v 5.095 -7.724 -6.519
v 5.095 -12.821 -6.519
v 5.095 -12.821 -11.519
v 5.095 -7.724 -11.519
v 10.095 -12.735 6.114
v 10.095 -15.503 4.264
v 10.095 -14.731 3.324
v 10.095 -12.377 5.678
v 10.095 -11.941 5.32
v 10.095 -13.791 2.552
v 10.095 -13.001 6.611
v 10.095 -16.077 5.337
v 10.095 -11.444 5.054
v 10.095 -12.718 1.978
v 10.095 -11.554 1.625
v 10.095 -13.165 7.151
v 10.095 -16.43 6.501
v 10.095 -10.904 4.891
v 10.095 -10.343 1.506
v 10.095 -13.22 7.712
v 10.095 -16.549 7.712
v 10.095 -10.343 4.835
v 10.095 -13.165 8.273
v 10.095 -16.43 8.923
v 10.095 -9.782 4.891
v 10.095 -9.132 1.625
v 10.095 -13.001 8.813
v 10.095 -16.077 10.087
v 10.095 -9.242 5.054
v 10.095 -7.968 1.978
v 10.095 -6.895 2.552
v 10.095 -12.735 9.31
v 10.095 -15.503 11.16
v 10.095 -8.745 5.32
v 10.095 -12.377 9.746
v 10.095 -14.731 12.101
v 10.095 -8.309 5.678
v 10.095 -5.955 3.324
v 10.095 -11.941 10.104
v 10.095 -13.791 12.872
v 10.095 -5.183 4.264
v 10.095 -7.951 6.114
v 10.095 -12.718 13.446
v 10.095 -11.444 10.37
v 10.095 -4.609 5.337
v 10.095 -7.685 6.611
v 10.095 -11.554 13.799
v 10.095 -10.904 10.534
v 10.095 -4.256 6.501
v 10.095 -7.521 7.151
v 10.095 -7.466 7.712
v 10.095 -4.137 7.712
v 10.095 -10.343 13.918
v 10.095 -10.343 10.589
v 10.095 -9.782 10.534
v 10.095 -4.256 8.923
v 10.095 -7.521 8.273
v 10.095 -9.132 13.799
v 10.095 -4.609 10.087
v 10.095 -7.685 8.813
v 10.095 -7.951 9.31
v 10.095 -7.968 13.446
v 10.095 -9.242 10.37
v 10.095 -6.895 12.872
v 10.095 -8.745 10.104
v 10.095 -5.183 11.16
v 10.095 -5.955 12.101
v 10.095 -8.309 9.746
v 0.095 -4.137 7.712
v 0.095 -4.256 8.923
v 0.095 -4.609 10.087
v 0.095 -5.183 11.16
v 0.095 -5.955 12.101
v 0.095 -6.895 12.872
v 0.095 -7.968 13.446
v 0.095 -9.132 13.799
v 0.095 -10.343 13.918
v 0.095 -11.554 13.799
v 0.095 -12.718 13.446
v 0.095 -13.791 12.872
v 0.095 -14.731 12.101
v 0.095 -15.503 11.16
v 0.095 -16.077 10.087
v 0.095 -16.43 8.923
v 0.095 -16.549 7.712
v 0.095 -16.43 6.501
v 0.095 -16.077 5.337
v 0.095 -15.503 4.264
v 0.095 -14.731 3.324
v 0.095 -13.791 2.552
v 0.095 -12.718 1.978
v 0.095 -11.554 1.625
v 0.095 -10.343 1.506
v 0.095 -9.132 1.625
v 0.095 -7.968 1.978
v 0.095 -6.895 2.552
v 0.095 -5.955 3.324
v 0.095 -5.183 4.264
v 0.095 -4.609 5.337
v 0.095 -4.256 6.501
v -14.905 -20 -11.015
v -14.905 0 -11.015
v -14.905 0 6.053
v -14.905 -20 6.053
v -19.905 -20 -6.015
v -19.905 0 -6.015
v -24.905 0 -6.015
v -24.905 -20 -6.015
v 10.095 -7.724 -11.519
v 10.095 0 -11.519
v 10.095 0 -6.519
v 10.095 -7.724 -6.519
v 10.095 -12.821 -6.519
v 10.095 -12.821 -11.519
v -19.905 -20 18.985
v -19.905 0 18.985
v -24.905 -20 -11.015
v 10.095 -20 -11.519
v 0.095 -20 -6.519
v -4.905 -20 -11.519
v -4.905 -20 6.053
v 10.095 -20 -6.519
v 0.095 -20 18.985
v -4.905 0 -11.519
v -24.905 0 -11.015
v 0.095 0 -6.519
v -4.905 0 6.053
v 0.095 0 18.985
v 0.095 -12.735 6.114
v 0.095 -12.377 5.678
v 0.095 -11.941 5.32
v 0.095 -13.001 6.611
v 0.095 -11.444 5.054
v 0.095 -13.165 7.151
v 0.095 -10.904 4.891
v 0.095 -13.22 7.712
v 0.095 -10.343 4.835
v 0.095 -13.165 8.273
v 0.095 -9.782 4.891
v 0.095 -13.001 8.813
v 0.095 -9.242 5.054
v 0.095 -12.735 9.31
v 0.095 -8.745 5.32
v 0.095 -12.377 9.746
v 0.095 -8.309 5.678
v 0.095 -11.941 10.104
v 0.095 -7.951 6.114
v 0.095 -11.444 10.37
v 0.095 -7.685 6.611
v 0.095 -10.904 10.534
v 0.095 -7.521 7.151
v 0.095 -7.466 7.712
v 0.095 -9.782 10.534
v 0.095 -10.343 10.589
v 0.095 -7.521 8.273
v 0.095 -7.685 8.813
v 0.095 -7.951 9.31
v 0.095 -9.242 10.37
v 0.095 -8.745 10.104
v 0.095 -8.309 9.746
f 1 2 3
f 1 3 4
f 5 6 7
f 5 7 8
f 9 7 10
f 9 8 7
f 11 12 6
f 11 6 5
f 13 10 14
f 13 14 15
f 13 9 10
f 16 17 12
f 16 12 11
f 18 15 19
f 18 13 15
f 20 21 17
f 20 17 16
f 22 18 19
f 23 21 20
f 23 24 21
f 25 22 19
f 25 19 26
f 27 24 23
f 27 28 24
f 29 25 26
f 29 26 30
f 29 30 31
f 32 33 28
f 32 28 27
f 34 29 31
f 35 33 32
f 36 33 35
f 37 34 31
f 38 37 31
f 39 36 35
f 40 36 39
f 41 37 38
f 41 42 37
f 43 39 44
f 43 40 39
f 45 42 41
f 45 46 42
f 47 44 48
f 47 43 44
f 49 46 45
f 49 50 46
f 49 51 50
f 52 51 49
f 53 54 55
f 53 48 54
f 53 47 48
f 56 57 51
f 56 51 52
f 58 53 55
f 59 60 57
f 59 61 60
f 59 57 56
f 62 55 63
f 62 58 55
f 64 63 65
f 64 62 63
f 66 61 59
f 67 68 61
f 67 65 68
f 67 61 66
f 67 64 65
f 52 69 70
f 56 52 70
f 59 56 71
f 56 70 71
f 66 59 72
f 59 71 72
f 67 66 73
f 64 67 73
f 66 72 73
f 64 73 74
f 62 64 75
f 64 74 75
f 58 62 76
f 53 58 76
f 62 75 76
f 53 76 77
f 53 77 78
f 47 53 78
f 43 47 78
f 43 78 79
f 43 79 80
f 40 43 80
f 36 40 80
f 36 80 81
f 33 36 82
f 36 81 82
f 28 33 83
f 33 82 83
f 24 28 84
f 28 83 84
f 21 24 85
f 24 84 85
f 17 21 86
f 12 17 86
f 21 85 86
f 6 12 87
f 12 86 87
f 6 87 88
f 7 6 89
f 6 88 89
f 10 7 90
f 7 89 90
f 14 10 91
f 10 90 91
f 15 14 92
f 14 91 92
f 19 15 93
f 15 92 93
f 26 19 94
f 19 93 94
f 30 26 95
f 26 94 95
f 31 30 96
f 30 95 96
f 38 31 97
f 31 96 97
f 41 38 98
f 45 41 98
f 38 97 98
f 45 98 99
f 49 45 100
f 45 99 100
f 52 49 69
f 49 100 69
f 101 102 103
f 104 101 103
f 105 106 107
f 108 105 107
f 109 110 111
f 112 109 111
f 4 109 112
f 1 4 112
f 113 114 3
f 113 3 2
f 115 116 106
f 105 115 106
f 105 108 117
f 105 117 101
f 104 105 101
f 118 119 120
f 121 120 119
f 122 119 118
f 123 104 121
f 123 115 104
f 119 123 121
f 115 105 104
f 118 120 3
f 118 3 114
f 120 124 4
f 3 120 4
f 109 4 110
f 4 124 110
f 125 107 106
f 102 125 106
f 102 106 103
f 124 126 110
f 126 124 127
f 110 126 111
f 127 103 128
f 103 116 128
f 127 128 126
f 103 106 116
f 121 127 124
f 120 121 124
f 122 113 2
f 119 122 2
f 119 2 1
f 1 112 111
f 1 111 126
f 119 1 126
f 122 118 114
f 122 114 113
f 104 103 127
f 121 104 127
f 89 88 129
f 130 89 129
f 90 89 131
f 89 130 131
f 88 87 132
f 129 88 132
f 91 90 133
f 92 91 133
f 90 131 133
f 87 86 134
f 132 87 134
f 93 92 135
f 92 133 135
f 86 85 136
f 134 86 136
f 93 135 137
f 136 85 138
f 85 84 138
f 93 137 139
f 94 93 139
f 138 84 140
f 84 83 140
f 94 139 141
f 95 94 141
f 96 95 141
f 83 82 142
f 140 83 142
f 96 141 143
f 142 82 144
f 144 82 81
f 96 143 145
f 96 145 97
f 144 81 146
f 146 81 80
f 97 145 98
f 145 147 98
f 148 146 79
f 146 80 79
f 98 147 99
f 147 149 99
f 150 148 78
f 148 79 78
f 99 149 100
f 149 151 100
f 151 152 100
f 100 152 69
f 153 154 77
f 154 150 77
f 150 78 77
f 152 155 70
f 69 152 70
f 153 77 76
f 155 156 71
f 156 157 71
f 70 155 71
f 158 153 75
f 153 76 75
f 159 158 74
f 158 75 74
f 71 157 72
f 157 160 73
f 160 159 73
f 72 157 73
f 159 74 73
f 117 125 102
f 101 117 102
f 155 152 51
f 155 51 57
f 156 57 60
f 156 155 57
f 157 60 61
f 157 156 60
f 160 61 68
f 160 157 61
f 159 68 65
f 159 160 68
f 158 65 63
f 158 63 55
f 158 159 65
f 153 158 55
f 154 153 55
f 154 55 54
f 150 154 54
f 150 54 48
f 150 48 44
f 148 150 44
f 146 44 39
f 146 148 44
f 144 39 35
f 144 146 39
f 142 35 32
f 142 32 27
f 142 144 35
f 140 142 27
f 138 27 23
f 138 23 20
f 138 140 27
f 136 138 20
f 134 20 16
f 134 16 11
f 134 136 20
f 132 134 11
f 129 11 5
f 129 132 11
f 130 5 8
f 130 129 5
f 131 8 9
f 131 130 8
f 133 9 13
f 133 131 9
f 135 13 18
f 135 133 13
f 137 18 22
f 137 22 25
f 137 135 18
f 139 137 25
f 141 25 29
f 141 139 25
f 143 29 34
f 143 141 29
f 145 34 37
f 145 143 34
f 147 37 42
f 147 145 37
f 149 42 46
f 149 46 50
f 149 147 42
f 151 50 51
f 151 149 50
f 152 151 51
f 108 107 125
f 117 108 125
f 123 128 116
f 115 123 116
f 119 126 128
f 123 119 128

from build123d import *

# Parameters (mm, degrees)
F1_DEPTH = 20
F2_W     = 5.096997
F2_H     = 5
F3_DEPTH = 5
F4_R     = 6.206102
F4_R_2   = 2.876814
F5_DEPTH = 10


with BuildPart() as f1:
    # F0 (on Front) → F1 (new body)
    with BuildSketch(Plane.XZ):
        Polygon((-24.904566, -6.015427), (-24.904566, -11.015427), (-14.904566, -11.015427), (-14.904566, 6.053293), (-4.904566, 6.053293), (-4.904566, -11.519182), (10.095434, -11.519182), (10.095434, -6.519182), (0.095434, -6.519182), (0.095434, 18.984573), (-19.904566, 18.984573), (-19.904566, -6.015427), align=None)
    extrude(amount=F1_DEPTH)

    # F2 (on face) → F3 (cut)
    with BuildSketch(Plane.YZ.offset(10.095434)):
        with Locations((-10.272534, -9.019182)):
            Rectangle(F2_W, F2_H)
    extrude(amount=-F3_DEPTH, mode=Mode.SUBTRACT)


with BuildPart() as f5:
    # F4 (on face) → F5 (new body)
    with BuildSketch(Plane.YZ.offset(0.095434)):
        with Locations((-10.343011, 7.712185)):
            Circle(F4_R)
        with Locations((-10.343011, 7.712185)):
            Circle(F4_R_2, mode=Mode.SUBTRACT)
    extrude(amount=F5_DEPTH)


solid = Compound([f1.part, f5.part])
